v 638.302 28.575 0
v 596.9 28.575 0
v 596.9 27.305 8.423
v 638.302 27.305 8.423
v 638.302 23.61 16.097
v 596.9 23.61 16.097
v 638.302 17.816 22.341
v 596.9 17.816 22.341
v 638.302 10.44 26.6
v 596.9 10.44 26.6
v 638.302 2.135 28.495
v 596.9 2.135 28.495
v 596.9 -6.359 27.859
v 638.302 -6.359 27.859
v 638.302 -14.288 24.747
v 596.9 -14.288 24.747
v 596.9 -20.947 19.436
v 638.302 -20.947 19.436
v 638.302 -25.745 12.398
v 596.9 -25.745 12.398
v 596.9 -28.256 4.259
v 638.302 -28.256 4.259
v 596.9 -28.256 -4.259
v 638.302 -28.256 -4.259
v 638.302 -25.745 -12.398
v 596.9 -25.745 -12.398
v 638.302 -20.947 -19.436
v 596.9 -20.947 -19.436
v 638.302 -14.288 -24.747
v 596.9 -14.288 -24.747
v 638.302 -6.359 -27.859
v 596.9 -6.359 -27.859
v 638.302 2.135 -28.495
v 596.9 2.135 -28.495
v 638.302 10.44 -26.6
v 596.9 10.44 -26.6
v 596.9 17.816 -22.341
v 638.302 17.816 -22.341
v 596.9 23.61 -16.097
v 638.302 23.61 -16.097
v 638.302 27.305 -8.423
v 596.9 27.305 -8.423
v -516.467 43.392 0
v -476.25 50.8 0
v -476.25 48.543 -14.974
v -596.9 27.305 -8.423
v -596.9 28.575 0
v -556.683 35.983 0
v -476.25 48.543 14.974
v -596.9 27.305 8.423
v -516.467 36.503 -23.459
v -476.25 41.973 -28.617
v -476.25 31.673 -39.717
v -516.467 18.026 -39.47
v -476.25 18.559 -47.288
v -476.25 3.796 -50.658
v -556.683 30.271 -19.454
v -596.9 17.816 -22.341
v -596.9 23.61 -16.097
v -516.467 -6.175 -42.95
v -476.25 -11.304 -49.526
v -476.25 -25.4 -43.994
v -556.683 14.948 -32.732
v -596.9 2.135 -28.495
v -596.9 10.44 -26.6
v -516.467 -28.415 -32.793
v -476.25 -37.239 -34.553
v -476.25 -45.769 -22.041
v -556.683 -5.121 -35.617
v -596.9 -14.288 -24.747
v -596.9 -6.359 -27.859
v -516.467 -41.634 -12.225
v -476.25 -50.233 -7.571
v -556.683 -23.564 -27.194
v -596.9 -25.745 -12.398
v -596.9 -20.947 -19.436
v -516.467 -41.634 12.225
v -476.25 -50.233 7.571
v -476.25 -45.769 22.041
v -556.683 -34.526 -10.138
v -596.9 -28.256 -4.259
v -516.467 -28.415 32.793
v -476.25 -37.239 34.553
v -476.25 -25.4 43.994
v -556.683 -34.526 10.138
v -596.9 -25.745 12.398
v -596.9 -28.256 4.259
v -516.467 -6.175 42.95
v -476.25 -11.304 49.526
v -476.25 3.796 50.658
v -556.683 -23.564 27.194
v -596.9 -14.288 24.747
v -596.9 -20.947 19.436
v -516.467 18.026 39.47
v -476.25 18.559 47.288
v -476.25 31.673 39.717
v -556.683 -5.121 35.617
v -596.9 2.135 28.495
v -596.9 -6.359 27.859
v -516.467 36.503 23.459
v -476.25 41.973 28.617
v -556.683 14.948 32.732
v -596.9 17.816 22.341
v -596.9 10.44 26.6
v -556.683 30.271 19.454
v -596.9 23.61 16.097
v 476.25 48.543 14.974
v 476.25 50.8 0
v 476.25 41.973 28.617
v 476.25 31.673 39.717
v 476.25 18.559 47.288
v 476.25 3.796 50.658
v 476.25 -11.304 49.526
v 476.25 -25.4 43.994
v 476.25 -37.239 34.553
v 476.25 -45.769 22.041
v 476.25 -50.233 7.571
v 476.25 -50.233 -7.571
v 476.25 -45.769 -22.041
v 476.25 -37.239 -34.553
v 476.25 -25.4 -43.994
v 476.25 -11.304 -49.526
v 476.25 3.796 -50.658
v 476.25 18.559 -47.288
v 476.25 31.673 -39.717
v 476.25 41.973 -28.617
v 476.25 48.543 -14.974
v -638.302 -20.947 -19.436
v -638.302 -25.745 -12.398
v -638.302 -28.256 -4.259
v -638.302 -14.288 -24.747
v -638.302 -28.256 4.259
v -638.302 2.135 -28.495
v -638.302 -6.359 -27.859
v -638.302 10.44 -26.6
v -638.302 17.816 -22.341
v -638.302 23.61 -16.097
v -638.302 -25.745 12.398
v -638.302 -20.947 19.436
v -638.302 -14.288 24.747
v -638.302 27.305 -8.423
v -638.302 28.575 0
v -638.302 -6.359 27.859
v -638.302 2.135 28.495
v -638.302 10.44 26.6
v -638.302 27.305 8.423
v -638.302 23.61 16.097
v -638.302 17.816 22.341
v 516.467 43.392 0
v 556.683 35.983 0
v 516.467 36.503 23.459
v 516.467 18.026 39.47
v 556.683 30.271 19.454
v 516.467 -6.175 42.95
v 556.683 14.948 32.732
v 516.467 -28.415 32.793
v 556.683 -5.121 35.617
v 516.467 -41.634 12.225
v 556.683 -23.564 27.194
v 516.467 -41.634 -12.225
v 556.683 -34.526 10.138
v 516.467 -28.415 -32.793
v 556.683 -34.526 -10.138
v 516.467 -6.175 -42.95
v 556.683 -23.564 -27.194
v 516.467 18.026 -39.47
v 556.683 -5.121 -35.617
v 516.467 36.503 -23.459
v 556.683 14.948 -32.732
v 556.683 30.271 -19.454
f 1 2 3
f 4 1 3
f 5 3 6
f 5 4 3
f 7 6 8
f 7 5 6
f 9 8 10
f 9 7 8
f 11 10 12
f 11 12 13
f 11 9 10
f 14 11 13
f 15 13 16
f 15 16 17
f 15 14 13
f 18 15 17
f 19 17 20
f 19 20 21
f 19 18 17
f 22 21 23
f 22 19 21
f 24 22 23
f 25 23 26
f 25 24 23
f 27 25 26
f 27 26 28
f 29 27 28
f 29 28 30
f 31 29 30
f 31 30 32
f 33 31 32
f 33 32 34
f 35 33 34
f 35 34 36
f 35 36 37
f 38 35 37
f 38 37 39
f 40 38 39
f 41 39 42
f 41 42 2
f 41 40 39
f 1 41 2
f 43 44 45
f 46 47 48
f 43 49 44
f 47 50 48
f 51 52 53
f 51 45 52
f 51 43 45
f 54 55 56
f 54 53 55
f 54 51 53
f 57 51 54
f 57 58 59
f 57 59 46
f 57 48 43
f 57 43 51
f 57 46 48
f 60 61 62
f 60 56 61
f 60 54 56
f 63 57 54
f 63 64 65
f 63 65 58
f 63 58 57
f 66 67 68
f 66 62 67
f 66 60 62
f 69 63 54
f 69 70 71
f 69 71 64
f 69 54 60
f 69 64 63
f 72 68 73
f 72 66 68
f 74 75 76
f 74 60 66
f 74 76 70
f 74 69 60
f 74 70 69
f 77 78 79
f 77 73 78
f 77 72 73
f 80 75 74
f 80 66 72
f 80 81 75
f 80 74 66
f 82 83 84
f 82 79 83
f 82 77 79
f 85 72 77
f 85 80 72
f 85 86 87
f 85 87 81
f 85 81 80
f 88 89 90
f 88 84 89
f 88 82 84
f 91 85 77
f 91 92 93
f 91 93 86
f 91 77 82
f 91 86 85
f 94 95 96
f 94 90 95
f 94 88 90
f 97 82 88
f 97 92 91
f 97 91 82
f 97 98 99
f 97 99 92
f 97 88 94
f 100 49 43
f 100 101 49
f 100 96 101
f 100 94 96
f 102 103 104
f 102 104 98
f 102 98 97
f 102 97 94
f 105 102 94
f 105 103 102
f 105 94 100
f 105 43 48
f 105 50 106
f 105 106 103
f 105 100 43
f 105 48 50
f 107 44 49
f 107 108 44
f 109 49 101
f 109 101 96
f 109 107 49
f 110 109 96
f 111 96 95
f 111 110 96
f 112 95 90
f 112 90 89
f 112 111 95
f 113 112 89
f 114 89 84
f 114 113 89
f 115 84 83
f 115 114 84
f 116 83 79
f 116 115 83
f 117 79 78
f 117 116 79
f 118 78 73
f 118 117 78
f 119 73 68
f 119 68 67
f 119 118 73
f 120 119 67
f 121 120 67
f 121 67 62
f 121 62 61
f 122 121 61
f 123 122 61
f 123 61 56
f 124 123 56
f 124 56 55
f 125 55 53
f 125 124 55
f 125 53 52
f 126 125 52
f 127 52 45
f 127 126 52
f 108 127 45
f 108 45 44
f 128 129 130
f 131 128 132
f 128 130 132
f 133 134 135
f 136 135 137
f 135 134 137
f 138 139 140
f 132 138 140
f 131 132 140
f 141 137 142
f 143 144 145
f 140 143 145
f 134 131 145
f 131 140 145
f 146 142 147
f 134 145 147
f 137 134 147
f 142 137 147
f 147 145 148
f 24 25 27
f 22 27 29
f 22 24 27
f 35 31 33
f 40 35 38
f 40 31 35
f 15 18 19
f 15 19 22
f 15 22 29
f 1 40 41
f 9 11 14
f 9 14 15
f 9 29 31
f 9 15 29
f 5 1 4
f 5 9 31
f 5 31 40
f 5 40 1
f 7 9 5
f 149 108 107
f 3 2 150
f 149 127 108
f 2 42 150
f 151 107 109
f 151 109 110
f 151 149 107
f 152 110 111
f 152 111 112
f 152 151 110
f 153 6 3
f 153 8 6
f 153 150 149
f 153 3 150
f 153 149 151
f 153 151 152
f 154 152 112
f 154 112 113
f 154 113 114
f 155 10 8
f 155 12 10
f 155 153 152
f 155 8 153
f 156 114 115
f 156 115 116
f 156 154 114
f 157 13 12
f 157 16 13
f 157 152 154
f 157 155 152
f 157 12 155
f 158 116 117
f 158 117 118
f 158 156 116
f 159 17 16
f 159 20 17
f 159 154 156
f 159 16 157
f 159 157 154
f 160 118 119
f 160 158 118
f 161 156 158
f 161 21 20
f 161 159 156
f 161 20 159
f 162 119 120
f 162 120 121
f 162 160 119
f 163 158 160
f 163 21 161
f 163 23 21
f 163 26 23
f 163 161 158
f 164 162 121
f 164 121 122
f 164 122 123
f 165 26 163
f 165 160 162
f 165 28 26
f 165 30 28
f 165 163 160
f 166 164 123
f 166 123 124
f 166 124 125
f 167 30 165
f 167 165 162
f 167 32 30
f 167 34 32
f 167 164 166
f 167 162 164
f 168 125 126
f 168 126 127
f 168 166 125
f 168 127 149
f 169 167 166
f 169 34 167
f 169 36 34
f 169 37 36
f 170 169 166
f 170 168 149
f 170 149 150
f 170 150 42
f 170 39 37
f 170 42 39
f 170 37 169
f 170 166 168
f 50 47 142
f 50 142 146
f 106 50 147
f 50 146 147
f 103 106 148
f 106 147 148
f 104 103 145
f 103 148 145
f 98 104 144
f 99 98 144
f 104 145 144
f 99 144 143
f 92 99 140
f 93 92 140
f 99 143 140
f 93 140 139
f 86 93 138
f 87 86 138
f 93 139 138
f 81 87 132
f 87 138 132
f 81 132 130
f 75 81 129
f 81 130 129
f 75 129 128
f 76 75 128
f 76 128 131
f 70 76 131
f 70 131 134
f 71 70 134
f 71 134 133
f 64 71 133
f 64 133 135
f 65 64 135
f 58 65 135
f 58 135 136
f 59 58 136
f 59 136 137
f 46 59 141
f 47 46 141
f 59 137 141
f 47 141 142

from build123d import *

# Parameters (mm, degrees)
F0_R       = 50.8
F1_DEPTH   = 476.25
F3_R       = 28.575
F4_DEPTH   = 41.402
F1_FACE_R  = 50.8
F4_FACE_R  = 28.575
F1_FACE1_R = 50.8
F5_FACE_R  = 28.575


with BuildPart() as f1:
    # F0 (on Right) → F1 (new body, symmetric)
    with BuildSketch(Plane.YZ):
        Circle(F0_R)
    extrude(amount=F1_DEPTH, both=True)



with BuildPart() as f4:
    # F3 (on offset) → F4 (new body)
    with BuildSketch(Plane.YZ.offset(638.302)):
        Circle(F3_R)
    extrude(amount=-F4_DEPTH)


with BuildPart() as f5_1:
    # F5: instance of F4
    add(f4.part.mirror(Plane.YZ))


with BuildPart() as f1_1:
    add(f1.part)

    add(f4.part)  # F6 merges F4
    # F1_face (on face) → F6 section 0
    with BuildSketch(Plane.YZ.offset(476.25)):
        Circle(F1_FACE_R)
    # F4_face (on face) → F6 section 1
    with BuildSketch(Plane(origin=(596.9, 0, 0), x_dir=(0, 1, 0), z_dir=(-1, 0, 0))):
        Circle(F4_FACE_R)
    loft()


    add(f5_1.part)  # F7 merges F5_1
    # F1_face1 (on face) → F7 section 0
    with BuildSketch(Plane(origin=(-476.25, 0, 0), x_dir=(0, 1, 0), z_dir=(-1, 0, 0))):
        Circle(F1_FACE1_R)
    # F5_face (on face) → F7 section 1
    with BuildSketch(Plane.YZ.offset(-596.9)):
        Circle(F5_FACE_R)
    loft()


solid = f1_1.part
